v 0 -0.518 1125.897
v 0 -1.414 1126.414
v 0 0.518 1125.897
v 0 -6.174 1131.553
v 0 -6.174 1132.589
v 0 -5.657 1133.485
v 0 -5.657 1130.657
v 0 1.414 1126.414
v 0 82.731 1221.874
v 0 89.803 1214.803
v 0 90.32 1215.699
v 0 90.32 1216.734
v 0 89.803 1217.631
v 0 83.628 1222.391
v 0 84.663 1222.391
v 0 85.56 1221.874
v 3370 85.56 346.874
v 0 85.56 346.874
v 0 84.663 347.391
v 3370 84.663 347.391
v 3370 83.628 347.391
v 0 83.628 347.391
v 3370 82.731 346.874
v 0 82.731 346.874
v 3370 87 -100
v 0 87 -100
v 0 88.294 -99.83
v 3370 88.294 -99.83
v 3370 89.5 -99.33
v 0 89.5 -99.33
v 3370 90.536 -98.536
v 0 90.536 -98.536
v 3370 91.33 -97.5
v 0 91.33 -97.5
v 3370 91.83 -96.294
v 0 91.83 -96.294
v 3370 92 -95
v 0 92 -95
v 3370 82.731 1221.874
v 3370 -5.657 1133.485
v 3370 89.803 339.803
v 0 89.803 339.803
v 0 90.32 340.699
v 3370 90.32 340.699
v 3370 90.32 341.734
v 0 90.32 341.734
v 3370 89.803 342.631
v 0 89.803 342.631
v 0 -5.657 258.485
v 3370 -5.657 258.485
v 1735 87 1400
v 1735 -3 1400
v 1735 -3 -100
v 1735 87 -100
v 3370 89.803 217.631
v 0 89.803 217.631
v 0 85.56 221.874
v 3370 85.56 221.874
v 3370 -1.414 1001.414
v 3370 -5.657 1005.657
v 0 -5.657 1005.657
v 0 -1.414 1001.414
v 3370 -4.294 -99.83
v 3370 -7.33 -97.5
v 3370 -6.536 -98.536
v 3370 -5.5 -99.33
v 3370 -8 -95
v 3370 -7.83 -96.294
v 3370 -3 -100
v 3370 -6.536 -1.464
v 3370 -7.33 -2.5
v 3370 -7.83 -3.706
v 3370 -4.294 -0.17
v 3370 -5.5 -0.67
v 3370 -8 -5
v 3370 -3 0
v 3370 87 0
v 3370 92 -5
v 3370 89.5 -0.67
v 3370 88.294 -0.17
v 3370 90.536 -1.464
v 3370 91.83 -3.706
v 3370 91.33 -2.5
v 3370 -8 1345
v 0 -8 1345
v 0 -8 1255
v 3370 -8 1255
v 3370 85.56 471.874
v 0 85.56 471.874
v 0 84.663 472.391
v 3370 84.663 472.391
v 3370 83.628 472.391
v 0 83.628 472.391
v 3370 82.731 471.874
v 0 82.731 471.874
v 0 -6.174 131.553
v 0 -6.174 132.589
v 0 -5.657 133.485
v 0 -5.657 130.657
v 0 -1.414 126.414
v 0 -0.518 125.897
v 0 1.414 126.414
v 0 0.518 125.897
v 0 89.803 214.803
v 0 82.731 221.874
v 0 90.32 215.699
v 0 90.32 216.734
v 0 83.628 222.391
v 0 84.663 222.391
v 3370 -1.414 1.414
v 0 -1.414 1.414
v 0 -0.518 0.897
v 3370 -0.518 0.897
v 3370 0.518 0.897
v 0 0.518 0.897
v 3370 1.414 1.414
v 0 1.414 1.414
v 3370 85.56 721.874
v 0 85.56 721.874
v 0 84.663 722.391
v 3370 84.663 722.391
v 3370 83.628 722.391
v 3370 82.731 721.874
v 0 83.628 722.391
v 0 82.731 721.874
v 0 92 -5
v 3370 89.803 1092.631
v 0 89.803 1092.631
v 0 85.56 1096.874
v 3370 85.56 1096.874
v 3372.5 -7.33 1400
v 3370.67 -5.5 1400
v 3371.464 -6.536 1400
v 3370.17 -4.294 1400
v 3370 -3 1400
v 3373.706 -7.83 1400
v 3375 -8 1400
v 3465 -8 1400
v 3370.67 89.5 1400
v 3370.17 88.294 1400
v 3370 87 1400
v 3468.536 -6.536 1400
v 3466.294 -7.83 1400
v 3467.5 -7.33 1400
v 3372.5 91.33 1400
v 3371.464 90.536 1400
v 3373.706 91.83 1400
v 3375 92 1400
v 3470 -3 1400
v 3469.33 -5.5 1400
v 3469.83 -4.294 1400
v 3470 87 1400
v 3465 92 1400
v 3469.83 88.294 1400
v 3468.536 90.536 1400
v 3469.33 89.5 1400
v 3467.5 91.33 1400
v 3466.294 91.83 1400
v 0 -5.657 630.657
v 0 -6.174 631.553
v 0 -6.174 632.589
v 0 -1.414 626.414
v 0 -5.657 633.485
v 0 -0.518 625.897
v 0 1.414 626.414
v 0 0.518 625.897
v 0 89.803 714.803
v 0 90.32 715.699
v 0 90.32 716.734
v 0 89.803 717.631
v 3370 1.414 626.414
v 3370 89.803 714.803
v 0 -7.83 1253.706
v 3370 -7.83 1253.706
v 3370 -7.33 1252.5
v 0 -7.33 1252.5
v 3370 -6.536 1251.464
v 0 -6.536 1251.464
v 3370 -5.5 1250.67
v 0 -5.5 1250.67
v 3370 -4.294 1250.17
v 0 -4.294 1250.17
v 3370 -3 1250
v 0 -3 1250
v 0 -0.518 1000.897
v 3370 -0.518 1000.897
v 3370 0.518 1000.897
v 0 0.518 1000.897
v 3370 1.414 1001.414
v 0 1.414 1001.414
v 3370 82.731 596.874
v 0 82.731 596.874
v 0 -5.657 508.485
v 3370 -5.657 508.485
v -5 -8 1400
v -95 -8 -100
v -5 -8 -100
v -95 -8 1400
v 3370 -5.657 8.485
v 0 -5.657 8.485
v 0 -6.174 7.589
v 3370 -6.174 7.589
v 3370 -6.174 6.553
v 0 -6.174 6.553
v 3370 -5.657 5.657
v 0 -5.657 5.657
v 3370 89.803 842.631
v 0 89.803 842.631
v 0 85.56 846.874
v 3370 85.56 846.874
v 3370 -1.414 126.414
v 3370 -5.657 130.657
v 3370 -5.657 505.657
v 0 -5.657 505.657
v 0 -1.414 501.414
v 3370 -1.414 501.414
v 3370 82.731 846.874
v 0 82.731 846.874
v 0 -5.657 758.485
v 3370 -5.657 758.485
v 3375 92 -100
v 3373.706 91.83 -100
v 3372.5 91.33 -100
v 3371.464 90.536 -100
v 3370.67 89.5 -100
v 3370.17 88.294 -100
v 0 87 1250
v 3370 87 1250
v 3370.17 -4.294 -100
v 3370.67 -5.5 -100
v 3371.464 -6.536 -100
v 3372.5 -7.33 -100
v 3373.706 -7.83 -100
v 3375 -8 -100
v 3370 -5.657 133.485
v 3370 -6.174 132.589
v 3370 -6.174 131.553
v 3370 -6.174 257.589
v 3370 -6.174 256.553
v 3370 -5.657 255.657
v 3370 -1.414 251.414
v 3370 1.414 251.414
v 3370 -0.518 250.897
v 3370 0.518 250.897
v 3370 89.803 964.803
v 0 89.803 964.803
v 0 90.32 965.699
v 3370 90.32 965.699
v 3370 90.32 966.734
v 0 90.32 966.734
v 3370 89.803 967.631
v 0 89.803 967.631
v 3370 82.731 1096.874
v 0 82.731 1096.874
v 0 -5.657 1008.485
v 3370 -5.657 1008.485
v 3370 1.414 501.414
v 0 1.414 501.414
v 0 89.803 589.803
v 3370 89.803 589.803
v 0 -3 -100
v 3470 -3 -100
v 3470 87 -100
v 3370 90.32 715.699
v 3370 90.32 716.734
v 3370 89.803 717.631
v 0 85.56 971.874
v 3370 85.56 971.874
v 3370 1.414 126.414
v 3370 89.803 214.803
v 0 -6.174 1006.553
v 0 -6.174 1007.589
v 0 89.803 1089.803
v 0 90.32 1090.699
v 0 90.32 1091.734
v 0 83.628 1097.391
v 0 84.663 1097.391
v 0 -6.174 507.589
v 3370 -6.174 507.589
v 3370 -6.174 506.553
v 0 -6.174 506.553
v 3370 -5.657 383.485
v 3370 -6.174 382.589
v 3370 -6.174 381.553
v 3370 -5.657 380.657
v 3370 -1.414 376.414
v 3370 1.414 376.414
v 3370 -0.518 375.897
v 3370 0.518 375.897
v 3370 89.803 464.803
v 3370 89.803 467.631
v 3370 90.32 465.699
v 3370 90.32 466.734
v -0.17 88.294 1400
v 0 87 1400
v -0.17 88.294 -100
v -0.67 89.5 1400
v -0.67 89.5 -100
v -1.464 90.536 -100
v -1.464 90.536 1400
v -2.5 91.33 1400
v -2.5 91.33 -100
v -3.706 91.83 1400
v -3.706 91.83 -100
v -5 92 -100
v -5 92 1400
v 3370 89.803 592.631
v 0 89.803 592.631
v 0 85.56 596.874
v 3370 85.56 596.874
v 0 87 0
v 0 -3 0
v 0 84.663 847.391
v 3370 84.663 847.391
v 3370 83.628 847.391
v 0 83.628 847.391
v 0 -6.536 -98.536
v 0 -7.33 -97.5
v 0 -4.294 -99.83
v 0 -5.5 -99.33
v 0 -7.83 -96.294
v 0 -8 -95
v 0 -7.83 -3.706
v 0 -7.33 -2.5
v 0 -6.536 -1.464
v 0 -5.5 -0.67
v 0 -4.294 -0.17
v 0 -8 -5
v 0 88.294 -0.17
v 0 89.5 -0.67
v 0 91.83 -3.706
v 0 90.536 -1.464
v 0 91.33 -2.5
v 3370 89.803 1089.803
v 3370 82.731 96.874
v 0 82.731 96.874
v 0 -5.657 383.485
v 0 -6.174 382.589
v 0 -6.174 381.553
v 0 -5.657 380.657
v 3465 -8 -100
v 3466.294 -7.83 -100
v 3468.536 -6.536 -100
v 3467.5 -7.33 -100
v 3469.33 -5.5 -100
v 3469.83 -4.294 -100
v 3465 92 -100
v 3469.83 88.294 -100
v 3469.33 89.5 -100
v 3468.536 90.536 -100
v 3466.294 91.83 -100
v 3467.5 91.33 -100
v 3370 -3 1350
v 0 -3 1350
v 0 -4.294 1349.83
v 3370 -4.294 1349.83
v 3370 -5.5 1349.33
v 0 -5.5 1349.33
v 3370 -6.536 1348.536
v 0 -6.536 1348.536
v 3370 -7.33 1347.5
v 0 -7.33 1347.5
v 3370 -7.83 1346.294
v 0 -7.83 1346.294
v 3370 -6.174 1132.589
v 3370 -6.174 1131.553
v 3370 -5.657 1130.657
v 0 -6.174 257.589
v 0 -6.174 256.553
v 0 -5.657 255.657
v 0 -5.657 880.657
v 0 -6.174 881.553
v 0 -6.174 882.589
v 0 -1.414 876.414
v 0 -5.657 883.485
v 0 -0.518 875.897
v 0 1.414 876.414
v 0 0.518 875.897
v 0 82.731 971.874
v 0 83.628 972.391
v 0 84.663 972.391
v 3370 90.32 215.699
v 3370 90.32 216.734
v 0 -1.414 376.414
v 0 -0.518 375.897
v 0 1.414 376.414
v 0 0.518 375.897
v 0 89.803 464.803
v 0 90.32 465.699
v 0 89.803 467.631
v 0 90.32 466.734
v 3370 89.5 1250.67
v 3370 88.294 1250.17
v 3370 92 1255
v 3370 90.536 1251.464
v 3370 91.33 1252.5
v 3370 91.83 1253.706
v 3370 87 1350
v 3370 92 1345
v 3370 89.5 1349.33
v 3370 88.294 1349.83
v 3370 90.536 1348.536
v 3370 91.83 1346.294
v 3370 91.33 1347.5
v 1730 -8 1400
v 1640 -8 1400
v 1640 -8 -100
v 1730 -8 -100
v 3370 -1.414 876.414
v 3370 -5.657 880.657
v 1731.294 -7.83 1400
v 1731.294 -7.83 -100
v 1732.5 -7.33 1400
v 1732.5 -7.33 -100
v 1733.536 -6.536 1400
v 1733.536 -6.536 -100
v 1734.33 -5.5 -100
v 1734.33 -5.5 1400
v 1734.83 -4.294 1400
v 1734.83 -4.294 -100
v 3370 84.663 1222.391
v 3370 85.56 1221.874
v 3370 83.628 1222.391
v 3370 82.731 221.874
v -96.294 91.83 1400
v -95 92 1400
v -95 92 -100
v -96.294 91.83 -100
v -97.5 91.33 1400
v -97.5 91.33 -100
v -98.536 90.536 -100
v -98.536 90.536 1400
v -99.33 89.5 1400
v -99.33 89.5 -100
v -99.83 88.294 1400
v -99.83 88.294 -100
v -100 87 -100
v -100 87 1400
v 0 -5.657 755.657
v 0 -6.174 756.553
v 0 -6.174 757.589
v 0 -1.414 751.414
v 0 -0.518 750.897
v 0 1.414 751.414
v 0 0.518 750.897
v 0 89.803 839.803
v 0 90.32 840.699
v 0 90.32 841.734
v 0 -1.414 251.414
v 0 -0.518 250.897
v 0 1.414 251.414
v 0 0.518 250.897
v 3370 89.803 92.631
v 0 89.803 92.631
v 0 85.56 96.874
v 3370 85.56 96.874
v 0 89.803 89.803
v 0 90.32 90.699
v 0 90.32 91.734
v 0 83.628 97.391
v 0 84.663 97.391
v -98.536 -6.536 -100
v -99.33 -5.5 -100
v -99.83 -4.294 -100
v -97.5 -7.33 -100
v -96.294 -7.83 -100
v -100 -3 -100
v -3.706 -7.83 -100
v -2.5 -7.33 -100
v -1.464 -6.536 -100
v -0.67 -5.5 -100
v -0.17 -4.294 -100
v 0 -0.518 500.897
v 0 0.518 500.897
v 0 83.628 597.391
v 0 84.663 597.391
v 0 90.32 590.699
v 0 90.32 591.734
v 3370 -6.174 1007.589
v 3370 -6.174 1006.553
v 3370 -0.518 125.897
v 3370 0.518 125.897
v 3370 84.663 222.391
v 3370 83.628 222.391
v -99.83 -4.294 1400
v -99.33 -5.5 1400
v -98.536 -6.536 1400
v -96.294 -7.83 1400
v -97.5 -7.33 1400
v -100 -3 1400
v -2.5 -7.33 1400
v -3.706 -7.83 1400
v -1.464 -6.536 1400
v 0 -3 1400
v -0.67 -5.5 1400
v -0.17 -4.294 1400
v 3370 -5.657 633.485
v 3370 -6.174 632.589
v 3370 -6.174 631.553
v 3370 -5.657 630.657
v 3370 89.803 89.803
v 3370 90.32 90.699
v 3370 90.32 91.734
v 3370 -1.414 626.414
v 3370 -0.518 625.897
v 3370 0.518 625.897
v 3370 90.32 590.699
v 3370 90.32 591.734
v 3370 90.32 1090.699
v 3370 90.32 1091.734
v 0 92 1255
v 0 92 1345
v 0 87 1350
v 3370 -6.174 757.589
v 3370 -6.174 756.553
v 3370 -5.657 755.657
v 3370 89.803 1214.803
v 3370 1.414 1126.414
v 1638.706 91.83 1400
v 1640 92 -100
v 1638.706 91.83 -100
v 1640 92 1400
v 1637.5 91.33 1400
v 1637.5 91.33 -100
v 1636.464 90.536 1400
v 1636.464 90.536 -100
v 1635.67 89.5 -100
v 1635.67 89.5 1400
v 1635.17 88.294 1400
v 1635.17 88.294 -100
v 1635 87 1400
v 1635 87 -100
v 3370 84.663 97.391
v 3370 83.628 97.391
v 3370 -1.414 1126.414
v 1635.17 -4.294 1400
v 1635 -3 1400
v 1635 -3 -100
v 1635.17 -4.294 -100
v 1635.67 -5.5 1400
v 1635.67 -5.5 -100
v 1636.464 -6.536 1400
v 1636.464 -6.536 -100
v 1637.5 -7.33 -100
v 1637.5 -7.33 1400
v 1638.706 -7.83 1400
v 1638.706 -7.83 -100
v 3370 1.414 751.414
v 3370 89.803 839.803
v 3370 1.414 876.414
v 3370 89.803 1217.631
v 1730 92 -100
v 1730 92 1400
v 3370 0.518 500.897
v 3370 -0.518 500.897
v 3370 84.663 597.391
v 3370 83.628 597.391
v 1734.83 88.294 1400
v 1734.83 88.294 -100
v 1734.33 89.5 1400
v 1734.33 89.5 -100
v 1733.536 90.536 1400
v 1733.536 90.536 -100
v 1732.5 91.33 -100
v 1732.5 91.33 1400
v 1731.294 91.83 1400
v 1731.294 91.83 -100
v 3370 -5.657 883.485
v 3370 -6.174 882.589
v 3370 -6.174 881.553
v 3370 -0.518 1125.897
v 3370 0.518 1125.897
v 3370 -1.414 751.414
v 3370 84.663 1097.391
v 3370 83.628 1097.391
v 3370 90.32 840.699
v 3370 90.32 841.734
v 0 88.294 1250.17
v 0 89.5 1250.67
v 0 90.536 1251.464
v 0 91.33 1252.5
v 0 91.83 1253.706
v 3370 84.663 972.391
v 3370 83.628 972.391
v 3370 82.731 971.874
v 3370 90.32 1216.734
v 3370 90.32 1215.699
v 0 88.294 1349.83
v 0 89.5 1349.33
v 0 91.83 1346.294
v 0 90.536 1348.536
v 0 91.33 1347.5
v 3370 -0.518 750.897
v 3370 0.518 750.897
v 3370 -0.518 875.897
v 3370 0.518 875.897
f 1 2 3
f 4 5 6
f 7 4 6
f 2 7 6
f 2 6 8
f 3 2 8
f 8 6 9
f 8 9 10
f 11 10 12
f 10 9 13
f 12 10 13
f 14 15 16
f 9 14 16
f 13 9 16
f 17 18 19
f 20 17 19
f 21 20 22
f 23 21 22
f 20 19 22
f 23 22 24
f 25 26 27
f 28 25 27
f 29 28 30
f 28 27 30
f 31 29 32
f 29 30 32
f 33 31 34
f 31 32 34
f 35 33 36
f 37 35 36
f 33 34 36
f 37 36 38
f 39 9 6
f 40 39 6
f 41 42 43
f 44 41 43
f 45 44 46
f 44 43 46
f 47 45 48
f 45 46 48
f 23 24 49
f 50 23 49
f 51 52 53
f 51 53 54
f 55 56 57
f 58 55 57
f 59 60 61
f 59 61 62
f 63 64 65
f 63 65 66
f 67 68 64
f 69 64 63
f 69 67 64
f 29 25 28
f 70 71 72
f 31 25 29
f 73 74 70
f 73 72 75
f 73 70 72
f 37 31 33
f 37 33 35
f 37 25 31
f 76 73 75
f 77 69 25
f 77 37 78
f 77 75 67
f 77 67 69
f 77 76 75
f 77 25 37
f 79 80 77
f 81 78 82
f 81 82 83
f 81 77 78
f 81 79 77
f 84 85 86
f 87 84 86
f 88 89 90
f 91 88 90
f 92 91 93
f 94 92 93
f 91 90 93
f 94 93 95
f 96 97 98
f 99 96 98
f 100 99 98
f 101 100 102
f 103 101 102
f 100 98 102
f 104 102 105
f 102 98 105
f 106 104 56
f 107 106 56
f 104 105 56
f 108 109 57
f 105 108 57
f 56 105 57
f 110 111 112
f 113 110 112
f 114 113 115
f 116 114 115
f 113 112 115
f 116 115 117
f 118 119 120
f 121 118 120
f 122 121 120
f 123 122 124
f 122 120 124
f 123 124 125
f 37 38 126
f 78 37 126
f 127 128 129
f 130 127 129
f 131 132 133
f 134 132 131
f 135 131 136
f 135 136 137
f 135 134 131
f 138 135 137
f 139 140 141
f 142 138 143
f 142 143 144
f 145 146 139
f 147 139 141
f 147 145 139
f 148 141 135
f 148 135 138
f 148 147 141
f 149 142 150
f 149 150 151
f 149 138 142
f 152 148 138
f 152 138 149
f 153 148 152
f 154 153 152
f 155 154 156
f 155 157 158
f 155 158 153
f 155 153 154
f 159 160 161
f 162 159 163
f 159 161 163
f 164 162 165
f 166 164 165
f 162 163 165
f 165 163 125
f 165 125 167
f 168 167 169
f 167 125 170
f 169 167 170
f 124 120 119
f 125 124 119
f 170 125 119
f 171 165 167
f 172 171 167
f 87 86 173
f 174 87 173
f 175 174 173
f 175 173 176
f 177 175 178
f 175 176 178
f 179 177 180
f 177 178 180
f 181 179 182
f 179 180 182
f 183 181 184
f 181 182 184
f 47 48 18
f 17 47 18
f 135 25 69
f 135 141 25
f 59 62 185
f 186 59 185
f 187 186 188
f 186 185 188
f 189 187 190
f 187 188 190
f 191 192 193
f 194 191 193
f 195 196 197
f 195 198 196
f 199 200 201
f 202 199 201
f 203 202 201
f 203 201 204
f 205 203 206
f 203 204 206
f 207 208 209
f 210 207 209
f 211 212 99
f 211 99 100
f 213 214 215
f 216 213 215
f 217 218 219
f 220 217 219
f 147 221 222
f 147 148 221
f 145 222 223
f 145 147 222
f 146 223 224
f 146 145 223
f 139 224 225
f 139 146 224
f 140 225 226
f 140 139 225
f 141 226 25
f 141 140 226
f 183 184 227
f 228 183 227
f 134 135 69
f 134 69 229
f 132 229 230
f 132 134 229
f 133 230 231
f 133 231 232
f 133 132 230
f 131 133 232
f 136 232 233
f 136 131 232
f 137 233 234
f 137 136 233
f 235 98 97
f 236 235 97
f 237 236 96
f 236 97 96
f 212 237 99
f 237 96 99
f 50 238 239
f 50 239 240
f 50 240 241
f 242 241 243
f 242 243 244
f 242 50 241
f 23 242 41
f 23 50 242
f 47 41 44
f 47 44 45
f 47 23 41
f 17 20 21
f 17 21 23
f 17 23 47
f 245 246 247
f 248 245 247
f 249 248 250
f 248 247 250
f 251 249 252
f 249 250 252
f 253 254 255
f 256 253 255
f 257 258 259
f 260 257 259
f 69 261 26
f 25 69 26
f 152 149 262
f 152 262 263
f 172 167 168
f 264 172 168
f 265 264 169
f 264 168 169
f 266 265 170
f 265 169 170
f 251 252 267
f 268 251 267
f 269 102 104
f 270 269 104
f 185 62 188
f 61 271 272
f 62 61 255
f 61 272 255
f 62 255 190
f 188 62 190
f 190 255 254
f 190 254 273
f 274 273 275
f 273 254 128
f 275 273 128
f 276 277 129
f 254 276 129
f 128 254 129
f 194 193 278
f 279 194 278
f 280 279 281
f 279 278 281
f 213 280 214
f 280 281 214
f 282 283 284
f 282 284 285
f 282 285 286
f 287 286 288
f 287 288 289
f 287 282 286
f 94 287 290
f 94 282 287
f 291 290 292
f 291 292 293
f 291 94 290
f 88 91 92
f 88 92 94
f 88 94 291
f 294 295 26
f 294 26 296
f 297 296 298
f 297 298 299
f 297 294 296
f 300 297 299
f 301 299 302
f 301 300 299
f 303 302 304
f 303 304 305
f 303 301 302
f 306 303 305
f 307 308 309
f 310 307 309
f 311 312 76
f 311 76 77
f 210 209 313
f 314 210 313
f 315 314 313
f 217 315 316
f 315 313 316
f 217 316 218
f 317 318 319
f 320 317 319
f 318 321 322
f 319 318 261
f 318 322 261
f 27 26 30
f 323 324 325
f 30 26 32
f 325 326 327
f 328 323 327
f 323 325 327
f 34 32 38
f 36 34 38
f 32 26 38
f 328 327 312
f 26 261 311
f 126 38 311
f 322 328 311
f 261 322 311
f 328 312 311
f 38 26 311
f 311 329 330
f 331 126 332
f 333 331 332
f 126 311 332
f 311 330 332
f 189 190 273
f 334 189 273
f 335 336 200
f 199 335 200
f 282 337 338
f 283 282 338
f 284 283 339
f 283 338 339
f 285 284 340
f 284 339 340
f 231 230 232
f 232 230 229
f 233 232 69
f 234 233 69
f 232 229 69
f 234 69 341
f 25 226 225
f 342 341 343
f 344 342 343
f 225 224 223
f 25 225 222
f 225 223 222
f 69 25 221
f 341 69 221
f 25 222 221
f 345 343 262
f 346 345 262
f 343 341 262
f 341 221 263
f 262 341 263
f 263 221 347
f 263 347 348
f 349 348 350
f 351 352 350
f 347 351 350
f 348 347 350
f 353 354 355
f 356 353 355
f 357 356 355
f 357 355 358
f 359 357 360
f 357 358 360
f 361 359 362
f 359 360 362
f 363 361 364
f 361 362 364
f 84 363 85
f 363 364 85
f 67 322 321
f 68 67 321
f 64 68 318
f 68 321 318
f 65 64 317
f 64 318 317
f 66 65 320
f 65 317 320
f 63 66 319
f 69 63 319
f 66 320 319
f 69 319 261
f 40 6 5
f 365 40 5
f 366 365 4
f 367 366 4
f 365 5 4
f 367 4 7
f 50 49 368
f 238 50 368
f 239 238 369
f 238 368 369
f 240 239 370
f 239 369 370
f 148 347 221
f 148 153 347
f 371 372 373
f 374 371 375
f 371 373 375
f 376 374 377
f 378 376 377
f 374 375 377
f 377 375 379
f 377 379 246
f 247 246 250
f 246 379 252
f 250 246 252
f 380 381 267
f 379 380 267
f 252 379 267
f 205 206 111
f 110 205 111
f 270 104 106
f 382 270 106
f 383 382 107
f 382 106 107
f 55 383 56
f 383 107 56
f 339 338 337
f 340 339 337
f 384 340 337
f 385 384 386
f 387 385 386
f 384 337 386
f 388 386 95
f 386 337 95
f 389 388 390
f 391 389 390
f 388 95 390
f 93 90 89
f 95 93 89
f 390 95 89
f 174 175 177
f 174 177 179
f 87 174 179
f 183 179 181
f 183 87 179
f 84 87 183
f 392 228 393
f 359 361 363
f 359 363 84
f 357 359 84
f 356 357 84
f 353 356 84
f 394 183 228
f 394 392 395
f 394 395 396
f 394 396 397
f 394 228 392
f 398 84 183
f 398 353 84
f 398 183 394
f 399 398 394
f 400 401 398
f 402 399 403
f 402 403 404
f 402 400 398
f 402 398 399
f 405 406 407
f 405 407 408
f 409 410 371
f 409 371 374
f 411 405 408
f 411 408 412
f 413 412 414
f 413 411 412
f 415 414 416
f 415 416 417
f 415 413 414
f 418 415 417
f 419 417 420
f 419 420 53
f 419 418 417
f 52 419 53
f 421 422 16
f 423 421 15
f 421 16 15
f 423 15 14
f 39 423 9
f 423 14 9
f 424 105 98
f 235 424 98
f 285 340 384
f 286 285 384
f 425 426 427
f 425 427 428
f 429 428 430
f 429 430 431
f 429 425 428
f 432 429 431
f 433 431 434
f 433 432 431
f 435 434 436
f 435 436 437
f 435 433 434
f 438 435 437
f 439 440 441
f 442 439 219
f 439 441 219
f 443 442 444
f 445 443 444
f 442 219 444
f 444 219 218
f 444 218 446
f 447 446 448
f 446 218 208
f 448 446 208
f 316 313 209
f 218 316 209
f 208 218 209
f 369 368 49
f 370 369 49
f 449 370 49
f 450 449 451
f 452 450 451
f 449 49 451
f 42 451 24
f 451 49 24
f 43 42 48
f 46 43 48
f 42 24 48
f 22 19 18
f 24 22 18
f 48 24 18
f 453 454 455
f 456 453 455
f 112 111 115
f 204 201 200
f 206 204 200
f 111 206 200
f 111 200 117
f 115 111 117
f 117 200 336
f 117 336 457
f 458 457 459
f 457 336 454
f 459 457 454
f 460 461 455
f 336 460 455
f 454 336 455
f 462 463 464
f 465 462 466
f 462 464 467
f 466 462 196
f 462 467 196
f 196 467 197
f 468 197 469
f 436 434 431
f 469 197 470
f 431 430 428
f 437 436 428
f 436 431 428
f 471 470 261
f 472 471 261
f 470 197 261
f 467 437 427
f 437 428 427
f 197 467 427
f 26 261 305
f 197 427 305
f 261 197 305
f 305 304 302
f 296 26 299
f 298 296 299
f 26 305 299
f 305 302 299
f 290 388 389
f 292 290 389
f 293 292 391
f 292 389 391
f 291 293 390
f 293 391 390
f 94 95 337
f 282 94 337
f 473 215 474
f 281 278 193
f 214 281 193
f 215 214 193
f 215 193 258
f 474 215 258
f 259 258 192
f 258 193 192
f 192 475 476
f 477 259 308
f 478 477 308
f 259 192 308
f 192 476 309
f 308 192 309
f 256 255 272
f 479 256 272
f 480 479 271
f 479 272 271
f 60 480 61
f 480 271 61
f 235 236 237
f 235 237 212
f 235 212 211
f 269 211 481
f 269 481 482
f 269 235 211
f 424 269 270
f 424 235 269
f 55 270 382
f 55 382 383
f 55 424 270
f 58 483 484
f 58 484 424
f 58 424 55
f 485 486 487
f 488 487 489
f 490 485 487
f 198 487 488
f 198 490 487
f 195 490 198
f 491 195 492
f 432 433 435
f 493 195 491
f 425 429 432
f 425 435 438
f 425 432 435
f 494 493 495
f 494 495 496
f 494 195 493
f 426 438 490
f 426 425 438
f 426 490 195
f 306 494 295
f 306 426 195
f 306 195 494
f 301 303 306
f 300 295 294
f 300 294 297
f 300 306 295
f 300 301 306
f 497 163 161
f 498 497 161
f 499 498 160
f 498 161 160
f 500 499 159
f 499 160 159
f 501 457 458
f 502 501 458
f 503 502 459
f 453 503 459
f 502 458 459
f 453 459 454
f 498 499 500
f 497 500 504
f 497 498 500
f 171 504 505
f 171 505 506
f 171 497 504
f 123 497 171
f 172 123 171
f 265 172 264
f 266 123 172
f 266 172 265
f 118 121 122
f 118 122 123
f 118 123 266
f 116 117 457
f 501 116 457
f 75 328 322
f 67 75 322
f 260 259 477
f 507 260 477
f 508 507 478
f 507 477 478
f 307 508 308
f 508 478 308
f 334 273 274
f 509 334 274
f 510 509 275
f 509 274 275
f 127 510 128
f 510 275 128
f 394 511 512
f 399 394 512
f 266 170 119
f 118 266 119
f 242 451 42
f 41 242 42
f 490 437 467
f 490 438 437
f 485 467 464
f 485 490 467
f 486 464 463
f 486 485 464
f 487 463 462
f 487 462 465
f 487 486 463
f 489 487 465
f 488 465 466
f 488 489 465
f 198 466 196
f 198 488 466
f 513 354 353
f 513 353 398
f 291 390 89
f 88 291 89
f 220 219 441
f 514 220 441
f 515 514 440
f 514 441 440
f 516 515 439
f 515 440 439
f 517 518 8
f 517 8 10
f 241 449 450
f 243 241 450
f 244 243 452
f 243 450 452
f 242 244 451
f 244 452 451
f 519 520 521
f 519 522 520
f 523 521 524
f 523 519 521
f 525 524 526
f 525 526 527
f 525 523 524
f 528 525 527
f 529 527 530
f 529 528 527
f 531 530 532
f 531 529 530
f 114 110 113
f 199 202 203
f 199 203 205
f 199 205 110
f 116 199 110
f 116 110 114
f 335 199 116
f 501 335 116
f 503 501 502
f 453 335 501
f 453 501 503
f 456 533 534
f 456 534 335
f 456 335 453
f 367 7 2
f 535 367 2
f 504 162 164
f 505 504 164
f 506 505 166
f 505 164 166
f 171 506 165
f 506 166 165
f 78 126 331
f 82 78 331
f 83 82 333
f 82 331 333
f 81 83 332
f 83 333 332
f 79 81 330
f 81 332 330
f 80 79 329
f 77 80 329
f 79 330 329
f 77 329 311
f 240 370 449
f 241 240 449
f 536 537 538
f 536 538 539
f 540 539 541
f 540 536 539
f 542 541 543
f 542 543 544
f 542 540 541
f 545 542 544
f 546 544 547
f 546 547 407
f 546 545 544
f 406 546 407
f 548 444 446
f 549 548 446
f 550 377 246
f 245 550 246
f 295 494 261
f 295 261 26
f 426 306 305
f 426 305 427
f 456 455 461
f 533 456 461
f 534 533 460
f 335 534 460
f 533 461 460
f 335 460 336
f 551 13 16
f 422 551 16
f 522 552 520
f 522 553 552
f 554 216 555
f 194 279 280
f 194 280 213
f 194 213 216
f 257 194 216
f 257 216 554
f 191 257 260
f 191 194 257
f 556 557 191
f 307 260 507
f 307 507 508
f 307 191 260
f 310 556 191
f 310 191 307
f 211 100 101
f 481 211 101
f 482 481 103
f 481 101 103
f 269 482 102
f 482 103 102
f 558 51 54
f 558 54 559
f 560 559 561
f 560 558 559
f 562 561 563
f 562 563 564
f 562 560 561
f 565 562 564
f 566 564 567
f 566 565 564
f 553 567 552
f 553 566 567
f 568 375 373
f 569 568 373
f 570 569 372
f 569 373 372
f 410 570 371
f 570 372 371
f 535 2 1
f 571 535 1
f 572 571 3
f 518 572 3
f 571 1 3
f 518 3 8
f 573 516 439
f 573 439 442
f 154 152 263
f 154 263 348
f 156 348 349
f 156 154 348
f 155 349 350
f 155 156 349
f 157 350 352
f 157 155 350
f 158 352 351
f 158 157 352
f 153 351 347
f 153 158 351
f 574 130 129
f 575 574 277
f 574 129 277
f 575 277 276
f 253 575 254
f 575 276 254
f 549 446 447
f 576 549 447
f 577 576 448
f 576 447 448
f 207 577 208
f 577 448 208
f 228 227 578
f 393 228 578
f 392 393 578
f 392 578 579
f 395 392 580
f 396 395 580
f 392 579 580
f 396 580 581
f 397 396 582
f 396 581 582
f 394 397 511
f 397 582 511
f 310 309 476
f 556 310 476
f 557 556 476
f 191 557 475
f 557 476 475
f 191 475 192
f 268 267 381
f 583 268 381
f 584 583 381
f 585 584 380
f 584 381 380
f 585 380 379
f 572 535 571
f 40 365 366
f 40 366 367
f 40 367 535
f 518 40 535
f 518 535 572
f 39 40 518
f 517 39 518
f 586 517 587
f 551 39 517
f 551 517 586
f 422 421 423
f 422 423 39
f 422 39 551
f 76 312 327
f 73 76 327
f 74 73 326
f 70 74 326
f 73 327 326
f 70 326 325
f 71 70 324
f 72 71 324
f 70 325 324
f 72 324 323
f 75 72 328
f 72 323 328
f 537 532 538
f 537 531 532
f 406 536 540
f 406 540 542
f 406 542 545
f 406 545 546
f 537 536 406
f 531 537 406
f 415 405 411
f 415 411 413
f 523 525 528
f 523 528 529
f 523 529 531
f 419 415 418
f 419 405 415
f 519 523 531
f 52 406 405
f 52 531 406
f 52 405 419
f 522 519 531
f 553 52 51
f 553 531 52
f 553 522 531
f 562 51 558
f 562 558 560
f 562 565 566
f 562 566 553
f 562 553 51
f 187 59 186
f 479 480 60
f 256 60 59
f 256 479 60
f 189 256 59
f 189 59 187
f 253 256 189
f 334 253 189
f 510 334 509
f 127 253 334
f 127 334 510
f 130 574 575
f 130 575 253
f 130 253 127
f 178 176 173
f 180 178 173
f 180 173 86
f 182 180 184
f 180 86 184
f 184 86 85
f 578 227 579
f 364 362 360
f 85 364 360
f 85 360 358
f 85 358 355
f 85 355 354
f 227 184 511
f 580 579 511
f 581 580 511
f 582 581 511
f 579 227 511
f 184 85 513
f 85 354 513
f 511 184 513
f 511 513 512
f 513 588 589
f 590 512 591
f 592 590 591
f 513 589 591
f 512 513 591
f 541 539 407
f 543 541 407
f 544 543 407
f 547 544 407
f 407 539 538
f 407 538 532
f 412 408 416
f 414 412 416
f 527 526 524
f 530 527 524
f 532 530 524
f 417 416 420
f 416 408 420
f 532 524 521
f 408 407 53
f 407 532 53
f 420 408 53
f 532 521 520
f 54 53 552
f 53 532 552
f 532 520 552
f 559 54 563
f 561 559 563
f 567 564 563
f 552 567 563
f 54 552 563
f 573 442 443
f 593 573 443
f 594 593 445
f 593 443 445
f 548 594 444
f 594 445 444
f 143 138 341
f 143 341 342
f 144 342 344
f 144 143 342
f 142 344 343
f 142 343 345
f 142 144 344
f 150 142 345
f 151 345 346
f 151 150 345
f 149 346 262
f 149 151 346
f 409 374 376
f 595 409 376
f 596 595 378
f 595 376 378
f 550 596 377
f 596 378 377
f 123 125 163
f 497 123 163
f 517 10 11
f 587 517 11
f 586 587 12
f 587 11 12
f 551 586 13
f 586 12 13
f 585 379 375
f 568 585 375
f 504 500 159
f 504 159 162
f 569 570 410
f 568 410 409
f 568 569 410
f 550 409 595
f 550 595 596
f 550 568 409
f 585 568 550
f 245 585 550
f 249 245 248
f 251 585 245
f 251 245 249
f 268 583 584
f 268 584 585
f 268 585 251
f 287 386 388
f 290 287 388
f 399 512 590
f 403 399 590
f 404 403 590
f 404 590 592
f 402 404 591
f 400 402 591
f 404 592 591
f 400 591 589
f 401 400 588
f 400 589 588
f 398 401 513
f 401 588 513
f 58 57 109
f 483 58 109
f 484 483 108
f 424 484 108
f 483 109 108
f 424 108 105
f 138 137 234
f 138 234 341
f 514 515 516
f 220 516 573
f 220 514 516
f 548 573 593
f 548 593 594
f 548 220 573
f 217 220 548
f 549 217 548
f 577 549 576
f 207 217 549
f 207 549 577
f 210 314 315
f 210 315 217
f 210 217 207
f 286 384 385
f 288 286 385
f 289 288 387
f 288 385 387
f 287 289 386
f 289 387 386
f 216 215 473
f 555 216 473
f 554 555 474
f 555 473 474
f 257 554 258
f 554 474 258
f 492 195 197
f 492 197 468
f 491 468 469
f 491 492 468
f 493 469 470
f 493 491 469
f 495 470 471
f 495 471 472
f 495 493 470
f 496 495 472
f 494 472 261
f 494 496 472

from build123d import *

# Parameters (mm, degrees)
F1_DEPTH      = 3370
F3_DEPTH      = 1400
F3_DEPTH_BACK = 100
F4_W          = 90
F4_H          = 100
F5_DEPTH      = 3370


# Not quite as in the source:
# - a feature names something its author has since deleted; it is built from what else it names


with BuildPart() as f1:
    # F0 (on Right) → F1 (new body)
    with BuildSketch(Plane.YZ):
        with BuildLine():
            ThreePointArc((-1.4142135624, 1.4142135624), (0, 0.8284271247), (1.4142135624, 1.4142135624))
            Line((1.4142135624, 1.4142135624), (89.8025612107, 89.8025612107))
            ThreePointArc((89.8025612107, 89.8025612107), (90.3883476483, 91.2167747731), (89.8025612107, 92.6309883354))
            Line((89.8025612107, 92.6309883354), (85.5599205236, 96.8736290226))
            ThreePointArc((85.5599205236, 96.8736290226), (84.1457069612, 97.4594154602), (82.7314933988, 96.8736290226))
            Line((82.7314933988, 96.8736290226), (-5.6568542495, 8.4852813742))
            ThreePointArc((-5.6568542495, 8.4852813742), (-6.2426406871, 7.0710678119), (-5.6568542495, 5.6568542495))
            Line((-5.6568542495, 5.6568542495), (-1.4142135624, 1.4142135624))
        make_face()
    extrude(amount=F1_DEPTH)


with BuildPart() as f1b:
    # F0 (on Right) → F1, piece 2 (new body)
    with BuildSketch(Plane.YZ):
        with BuildLine():
            ThreePointArc((-1.4142135624, 126.4142135624), (0, 125.8284271247), (1.4142135624, 126.4142135624))
            Line((1.4142135624, 126.4142135624), (89.8025612107, 214.8025612107))
            ThreePointArc((89.8025612107, 214.8025612107), (90.3883476483, 216.2167747731), (89.8025612107, 217.6309883354))
            Line((89.8025612107, 217.6309883354), (85.5599205236, 221.8736290226))
            ThreePointArc((85.5599205236, 221.8736290226), (84.1457069612, 222.4594154602), (82.7314933988, 221.8736290226))
            Line((82.7314933988, 221.8736290226), (-5.6568542495, 133.4852813742))
            ThreePointArc((-5.6568542495, 133.4852813742), (-6.2426406871, 132.0710678119), (-5.6568542495, 130.6568542495))
            Line((-5.6568542495, 130.6568542495), (-1.4142135624, 126.4142135624))
        make_face()
    extrude(amount=F1_DEPTH)


with BuildPart() as f1c:
    # F0 (on Right) → F1, piece 3 (new body)
    with BuildSketch(Plane.YZ):
        with BuildLine():
            ThreePointArc((-1.4142135624, 251.4142135624), (0, 250.8284271247), (1.4142135624, 251.4142135624))
            Line((1.4142135624, 251.4142135624), (89.8025612107, 339.8025612107))
            ThreePointArc((89.8025612107, 339.8025612107), (90.3883476483, 341.2167747731), (89.8025612107, 342.6309883354))
            Line((89.8025612107, 342.6309883354), (85.5599205236, 346.8736290226))
            ThreePointArc((85.5599205236, 346.8736290226), (84.1457069612, 347.4594154602), (82.7314933988, 346.8736290226))
            Line((82.7314933988, 346.8736290226), (-5.6568542495, 258.4852813742))
            ThreePointArc((-5.6568542495, 258.4852813742), (-6.2426406871, 257.0710678119), (-5.6568542495, 255.6568542495))
            Line((-5.6568542495, 255.6568542495), (-1.4142135624, 251.4142135624))
        make_face()
    extrude(amount=F1_DEPTH)


with BuildPart() as f1d:
    # F0 (on Right) → F1, piece 4 (new body)
    with BuildSketch(Plane.YZ):
        with BuildLine():
            ThreePointArc((-1.4142135624, 376.4142135624), (0, 375.8284271247), (1.4142135624, 376.4142135624))
            Line((1.4142135624, 376.4142135624), (89.8025612107, 464.8025612107))
            ThreePointArc((89.8025612107, 464.8025612107), (90.3883476483, 466.2167747731), (89.8025612107, 467.6309883354))
            Line((89.8025612107, 467.6309883354), (85.5599205236, 471.8736290226))
            ThreePointArc((85.5599205236, 471.8736290226), (84.1457069612, 472.4594154602), (82.7314933988, 471.8736290226))
            Line((82.7314933988, 471.8736290226), (-5.6568542495, 383.4852813742))
            ThreePointArc((-5.6568542495, 383.4852813742), (-6.2426406871, 382.0710678119), (-5.6568542495, 380.6568542495))
            Line((-5.6568542495, 380.6568542495), (-1.4142135624, 376.4142135624))
        make_face()
    extrude(amount=F1_DEPTH)


with BuildPart() as f1e:
    # F0 (on Right) → F1, piece 5 (new body)
    with BuildSketch(Plane.YZ):
        with BuildLine():
            ThreePointArc((-1.4142135624, 501.4142135624), (0, 500.8284271247), (1.4142135624, 501.4142135624))
            Line((1.4142135624, 501.4142135624), (89.8025612107, 589.8025612107))
            ThreePointArc((89.8025612107, 589.8025612107), (90.3883476483, 591.2167747731), (89.8025612107, 592.6309883354))
            Line((89.8025612107, 592.6309883354), (85.5599205236, 596.8736290226))
            ThreePointArc((85.5599205236, 596.8736290226), (84.1457069612, 597.4594154602), (82.7314933988, 596.8736290226))
            Line((82.7314933988, 596.8736290226), (-5.6568542495, 508.4852813742))
            ThreePointArc((-5.6568542495, 508.4852813742), (-6.2426406871, 507.0710678119), (-5.6568542495, 505.6568542495))
            Line((-5.6568542495, 505.6568542495), (-1.4142135624, 501.4142135624))
        make_face()
    extrude(amount=F1_DEPTH)


with BuildPart() as f1f:
    # F0 (on Right) → F1, piece 6 (new body)
    with BuildSketch(Plane.YZ):
        with BuildLine():
            ThreePointArc((-1.4142135624, 626.4142135624), (0, 625.8284271247), (1.4142135624, 626.4142135624))
            Line((1.4142135624, 626.4142135624), (89.8025612107, 714.8025612107))
            ThreePointArc((89.8025612107, 714.8025612107), (90.3883476483, 716.2167747731), (89.8025612107, 717.6309883354))
            Line((89.8025612107, 717.6309883354), (85.5599205236, 721.8736290226))
            ThreePointArc((85.5599205236, 721.8736290226), (84.1457069612, 722.4594154602), (82.7314933988, 721.8736290226))
            Line((82.7314933988, 721.8736290226), (-5.6568542495, 633.4852813742))
            ThreePointArc((-5.6568542495, 633.4852813742), (-6.2426406871, 632.0710678119), (-5.6568542495, 630.6568542495))
            Line((-5.6568542495, 630.6568542495), (-1.4142135624, 626.4142135624))
        make_face()
    extrude(amount=F1_DEPTH)


with BuildPart() as f1g:
    # F0 (on Right) → F1, piece 7 (new body)
    with BuildSketch(Plane.YZ):
        with BuildLine():
            ThreePointArc((-1.4142135624, 751.4142135624), (0, 750.8284271247), (1.4142135624, 751.4142135624))
            Line((1.4142135624, 751.4142135624), (89.8025612107, 839.8025612107))
            ThreePointArc((89.8025612107, 839.8025612107), (90.3883476483, 841.2167747731), (89.8025612107, 842.6309883354))
            Line((89.8025612107, 842.6309883354), (85.5599205236, 846.8736290226))
            ThreePointArc((85.5599205236, 846.8736290226), (84.1457069612, 847.4594154602), (82.7314933988, 846.8736290226))
            Line((82.7314933988, 846.8736290226), (-5.6568542495, 758.4852813742))
            ThreePointArc((-5.6568542495, 758.4852813742), (-6.2426406871, 757.0710678119), (-5.6568542495, 755.6568542495))
            Line((-5.6568542495, 755.6568542495), (-1.4142135624, 751.4142135624))
        make_face()
    extrude(amount=F1_DEPTH)


with BuildPart() as f1h:
    # F0 (on Right) → F1, piece 8 (new body)
    with BuildSketch(Plane.YZ):
        with BuildLine():
            ThreePointArc((-1.4142135624, 876.4142135624), (0, 875.8284271247), (1.4142135624, 876.4142135624))
            Line((1.4142135624, 876.4142135624), (89.8025612107, 964.8025612107))
            ThreePointArc((89.8025612107, 964.8025612107), (90.3883476483, 966.2167747731), (89.8025612107, 967.6309883354))
            Line((89.8025612107, 967.6309883354), (85.5599205236, 971.8736290226))
            ThreePointArc((85.5599205236, 971.8736290226), (84.1457069612, 972.4594154602), (82.7314933988, 971.8736290226))
            Line((82.7314933988, 971.8736290226), (-5.6568542495, 883.4852813742))
            ThreePointArc((-5.6568542495, 883.4852813742), (-6.2426406871, 882.0710678119), (-5.6568542495, 880.6568542495))
            Line((-5.6568542495, 880.6568542495), (-1.4142135624, 876.4142135624))
        make_face()
    extrude(amount=F1_DEPTH)


with BuildPart() as f1i:
    # F0 (on Right) → F1, piece 9 (new body)
    with BuildSketch(Plane.YZ):
        with BuildLine():
            ThreePointArc((-1.4142135624, 1001.4142135624), (0, 1000.8284271247), (1.4142135624, 1001.4142135624))
            Line((1.4142135624, 1001.4142135624), (89.8025612107, 1089.8025612107))
            ThreePointArc((89.8025612107, 1089.8025612107), (90.3883476483, 1091.2167747731), (89.8025612107, 1092.6309883354))
            Line((89.8025612107, 1092.6309883354), (85.5599205236, 1096.8736290226))
            ThreePointArc((85.5599205236, 1096.8736290226), (84.1457069612, 1097.4594154602), (82.7314933988, 1096.8736290226))
            Line((82.7314933988, 1096.8736290226), (-5.6568542495, 1008.4852813742))
            ThreePointArc((-5.6568542495, 1008.4852813742), (-6.2426406871, 1007.0710678119), (-5.6568542495, 1005.6568542495))
            Line((-5.6568542495, 1005.6568542495), (-1.4142135624, 1001.4142135624))
        make_face()
    extrude(amount=F1_DEPTH)


with BuildPart() as f1j:
    # F0 (on Right) → F1, piece 10 (new body)
    with BuildSketch(Plane.YZ):
        with BuildLine():
            ThreePointArc((-1.4142135624, 1126.4142135624), (0, 1125.8284271247), (1.4142135624, 1126.4142135624))
            Line((1.4142135624, 1126.4142135624), (89.8025612107, 1214.8025612107))
            ThreePointArc((89.8025612107, 1214.8025612107), (90.3883476483, 1216.2167747731), (89.8025612107, 1217.6309883354))
            Line((89.8025612107, 1217.6309883354), (85.5599205236, 1221.8736290226))
            ThreePointArc((85.5599205236, 1221.8736290226), (84.1457069612, 1222.4594154602), (82.7314933988, 1221.8736290226))
            Line((82.7314933988, 1221.8736290226), (-5.6568542495, 1133.4852813742))
            ThreePointArc((-5.6568542495, 1133.4852813742), (-6.2426406871, 1132.0710678119), (-5.6568542495, 1130.6568542495))
            Line((-5.6568542495, 1130.6568542495), (-1.4142135624, 1126.4142135624))
        make_face()
    extrude(amount=F1_DEPTH)


with BuildPart() as f3:
    # F2 (on Top) → F3 (new body, two sides)
    with BuildSketch(Plane.XY) as f3_sk:
        with BuildLine():
            Line((-95, -8), (-5, -8))
            ThreePointArc((-5, -8), (-1.4644660941, -6.5355339059), (0, -3))
            Line((0, -3), (0, 87))
            ThreePointArc((0, 87), (-1.4644660941, 90.5355339059), (-5, 92))
            Line((-5, 92), (-95, 92))
            ThreePointArc((-95, 92), (-98.5355339059, 90.5355339059), (-100, 87))
            Line((-100, 87), (-100, -3))
            ThreePointArc((-100, -3), (-98.5355339059, -6.5355339059), (-95, -8))
        make_face()
    extrude(amount=F3_DEPTH)
    extrude(f3_sk.sketch, amount=-F3_DEPTH_BACK)


with BuildPart() as f3b:
    # F2 (on Top) → F3, piece 2 (new body, two sides)
    with BuildSketch(Plane.XY) as f3_2_sk:
        with BuildLine():
            Line((1635, 87), (1635, -3))
            ThreePointArc((1635, -3), (1636.4644660941, -6.5355339059), (1640, -8))
            Line((1640, -8), (1730, -8))
            ThreePointArc((1730, -8), (1733.5355339059, -6.5355339059), (1735, -3))
            Line((1735, -3), (1735, 87))
            ThreePointArc((1735, 87), (1733.5355339059, 90.5355339059), (1730, 92))
            Line((1730, 92), (1640, 92))
            ThreePointArc((1640, 92), (1636.4644660941, 90.5355339059), (1635, 87))
        make_face()
    extrude(amount=F3_DEPTH)
    extrude(f3_2_sk.sketch, amount=-F3_DEPTH_BACK)


with BuildPart() as f3c:
    # F2 (on Top) → F3, piece 3 (new body, two sides)
    with BuildSketch(Plane.XY) as f3_3_sk:
        with BuildLine():
            Line((3370, 87), (3370, -3))
            ThreePointArc((3370, -3), (3371.4644660941, -6.5355339059), (3375, -8))
            Line((3375, -8), (3465, -8))
            ThreePointArc((3465, -8), (3468.5355339059, -6.5355339059), (3470, -3))
            Line((3470, -3), (3470, 87))
            ThreePointArc((3470, 87), (3468.5355339059, 90.5355339059), (3465, 92))
            Line((3465, 92), (3375, 92))
            ThreePointArc((3375, 92), (3371.4644660941, 90.5355339059), (3370, 87))
        make_face()
    extrude(amount=F3_DEPTH)
    extrude(f3_3_sk.sketch, amount=-F3_DEPTH_BACK)


with BuildPart() as f5:
    # F4 (on face) → F5 (new body)
    with BuildSketch(Plane.YZ):
        with Locations((42, 1300)):
            Rectangle(F4_W, F4_H)
        with BuildLine():
            Line((87, 1350), (87, 1250))
            ThreePointArc((87, 1250), (90.5355339059, 1251.4644660941), (92, 1255))
            Line((92, 1255), (92, 1345))
            ThreePointArc((92, 1345), (90.5355339059, 1348.5355339059), (87, 1350))
        make_face()
        with BuildLine():
            ThreePointArc((-8, 1255), (-6.5355339059, 1251.4644660941), (-3, 1250))
            Line((-3, 1250), (-3, 1350))
            ThreePointArc((-3, 1350), (-6.5355339059, 1348.5355339059), (-8, 1345))
            Line((-8, 1345), (-8, 1255))
        make_face()
    extrude(amount=F5_DEPTH)


with BuildPart() as f5b:
    # F4 (on face) → F5, piece 2 (new body)
    with BuildSketch(Plane.YZ):
        with Locations((42, -50)):
            Rectangle(F4_W, F4_H)
        with BuildLine():
            Line((87, 0), (87, -100))
            ThreePointArc((87, -100), (90.5355339059, -98.5355339059), (92, -95))
            Line((92, -95), (92, -5))
            ThreePointArc((92, -5), (90.5355339059, -1.4644660941), (87, 0))
        make_face()
        with BuildLine():
            ThreePointArc((-8, -95), (-6.5355339059, -98.5355339059), (-3, -100))
            Line((-3, -100), (-3, 0))
            ThreePointArc((-3, 0), (-6.5355339059, -1.4644660941), (-8, -5))
            Line((-8, -5), (-8, -95))
        make_face()
    extrude(amount=F5_DEPTH)


solid = Compound([f1.part, f1b.part, f1c.part, f1d.part, f1e.part, f1f.part, f1g.part, f1h.part, f1i.part, f1j.part, f3.part, f3b.part, f3c.part, f5.part, f5b.part])
